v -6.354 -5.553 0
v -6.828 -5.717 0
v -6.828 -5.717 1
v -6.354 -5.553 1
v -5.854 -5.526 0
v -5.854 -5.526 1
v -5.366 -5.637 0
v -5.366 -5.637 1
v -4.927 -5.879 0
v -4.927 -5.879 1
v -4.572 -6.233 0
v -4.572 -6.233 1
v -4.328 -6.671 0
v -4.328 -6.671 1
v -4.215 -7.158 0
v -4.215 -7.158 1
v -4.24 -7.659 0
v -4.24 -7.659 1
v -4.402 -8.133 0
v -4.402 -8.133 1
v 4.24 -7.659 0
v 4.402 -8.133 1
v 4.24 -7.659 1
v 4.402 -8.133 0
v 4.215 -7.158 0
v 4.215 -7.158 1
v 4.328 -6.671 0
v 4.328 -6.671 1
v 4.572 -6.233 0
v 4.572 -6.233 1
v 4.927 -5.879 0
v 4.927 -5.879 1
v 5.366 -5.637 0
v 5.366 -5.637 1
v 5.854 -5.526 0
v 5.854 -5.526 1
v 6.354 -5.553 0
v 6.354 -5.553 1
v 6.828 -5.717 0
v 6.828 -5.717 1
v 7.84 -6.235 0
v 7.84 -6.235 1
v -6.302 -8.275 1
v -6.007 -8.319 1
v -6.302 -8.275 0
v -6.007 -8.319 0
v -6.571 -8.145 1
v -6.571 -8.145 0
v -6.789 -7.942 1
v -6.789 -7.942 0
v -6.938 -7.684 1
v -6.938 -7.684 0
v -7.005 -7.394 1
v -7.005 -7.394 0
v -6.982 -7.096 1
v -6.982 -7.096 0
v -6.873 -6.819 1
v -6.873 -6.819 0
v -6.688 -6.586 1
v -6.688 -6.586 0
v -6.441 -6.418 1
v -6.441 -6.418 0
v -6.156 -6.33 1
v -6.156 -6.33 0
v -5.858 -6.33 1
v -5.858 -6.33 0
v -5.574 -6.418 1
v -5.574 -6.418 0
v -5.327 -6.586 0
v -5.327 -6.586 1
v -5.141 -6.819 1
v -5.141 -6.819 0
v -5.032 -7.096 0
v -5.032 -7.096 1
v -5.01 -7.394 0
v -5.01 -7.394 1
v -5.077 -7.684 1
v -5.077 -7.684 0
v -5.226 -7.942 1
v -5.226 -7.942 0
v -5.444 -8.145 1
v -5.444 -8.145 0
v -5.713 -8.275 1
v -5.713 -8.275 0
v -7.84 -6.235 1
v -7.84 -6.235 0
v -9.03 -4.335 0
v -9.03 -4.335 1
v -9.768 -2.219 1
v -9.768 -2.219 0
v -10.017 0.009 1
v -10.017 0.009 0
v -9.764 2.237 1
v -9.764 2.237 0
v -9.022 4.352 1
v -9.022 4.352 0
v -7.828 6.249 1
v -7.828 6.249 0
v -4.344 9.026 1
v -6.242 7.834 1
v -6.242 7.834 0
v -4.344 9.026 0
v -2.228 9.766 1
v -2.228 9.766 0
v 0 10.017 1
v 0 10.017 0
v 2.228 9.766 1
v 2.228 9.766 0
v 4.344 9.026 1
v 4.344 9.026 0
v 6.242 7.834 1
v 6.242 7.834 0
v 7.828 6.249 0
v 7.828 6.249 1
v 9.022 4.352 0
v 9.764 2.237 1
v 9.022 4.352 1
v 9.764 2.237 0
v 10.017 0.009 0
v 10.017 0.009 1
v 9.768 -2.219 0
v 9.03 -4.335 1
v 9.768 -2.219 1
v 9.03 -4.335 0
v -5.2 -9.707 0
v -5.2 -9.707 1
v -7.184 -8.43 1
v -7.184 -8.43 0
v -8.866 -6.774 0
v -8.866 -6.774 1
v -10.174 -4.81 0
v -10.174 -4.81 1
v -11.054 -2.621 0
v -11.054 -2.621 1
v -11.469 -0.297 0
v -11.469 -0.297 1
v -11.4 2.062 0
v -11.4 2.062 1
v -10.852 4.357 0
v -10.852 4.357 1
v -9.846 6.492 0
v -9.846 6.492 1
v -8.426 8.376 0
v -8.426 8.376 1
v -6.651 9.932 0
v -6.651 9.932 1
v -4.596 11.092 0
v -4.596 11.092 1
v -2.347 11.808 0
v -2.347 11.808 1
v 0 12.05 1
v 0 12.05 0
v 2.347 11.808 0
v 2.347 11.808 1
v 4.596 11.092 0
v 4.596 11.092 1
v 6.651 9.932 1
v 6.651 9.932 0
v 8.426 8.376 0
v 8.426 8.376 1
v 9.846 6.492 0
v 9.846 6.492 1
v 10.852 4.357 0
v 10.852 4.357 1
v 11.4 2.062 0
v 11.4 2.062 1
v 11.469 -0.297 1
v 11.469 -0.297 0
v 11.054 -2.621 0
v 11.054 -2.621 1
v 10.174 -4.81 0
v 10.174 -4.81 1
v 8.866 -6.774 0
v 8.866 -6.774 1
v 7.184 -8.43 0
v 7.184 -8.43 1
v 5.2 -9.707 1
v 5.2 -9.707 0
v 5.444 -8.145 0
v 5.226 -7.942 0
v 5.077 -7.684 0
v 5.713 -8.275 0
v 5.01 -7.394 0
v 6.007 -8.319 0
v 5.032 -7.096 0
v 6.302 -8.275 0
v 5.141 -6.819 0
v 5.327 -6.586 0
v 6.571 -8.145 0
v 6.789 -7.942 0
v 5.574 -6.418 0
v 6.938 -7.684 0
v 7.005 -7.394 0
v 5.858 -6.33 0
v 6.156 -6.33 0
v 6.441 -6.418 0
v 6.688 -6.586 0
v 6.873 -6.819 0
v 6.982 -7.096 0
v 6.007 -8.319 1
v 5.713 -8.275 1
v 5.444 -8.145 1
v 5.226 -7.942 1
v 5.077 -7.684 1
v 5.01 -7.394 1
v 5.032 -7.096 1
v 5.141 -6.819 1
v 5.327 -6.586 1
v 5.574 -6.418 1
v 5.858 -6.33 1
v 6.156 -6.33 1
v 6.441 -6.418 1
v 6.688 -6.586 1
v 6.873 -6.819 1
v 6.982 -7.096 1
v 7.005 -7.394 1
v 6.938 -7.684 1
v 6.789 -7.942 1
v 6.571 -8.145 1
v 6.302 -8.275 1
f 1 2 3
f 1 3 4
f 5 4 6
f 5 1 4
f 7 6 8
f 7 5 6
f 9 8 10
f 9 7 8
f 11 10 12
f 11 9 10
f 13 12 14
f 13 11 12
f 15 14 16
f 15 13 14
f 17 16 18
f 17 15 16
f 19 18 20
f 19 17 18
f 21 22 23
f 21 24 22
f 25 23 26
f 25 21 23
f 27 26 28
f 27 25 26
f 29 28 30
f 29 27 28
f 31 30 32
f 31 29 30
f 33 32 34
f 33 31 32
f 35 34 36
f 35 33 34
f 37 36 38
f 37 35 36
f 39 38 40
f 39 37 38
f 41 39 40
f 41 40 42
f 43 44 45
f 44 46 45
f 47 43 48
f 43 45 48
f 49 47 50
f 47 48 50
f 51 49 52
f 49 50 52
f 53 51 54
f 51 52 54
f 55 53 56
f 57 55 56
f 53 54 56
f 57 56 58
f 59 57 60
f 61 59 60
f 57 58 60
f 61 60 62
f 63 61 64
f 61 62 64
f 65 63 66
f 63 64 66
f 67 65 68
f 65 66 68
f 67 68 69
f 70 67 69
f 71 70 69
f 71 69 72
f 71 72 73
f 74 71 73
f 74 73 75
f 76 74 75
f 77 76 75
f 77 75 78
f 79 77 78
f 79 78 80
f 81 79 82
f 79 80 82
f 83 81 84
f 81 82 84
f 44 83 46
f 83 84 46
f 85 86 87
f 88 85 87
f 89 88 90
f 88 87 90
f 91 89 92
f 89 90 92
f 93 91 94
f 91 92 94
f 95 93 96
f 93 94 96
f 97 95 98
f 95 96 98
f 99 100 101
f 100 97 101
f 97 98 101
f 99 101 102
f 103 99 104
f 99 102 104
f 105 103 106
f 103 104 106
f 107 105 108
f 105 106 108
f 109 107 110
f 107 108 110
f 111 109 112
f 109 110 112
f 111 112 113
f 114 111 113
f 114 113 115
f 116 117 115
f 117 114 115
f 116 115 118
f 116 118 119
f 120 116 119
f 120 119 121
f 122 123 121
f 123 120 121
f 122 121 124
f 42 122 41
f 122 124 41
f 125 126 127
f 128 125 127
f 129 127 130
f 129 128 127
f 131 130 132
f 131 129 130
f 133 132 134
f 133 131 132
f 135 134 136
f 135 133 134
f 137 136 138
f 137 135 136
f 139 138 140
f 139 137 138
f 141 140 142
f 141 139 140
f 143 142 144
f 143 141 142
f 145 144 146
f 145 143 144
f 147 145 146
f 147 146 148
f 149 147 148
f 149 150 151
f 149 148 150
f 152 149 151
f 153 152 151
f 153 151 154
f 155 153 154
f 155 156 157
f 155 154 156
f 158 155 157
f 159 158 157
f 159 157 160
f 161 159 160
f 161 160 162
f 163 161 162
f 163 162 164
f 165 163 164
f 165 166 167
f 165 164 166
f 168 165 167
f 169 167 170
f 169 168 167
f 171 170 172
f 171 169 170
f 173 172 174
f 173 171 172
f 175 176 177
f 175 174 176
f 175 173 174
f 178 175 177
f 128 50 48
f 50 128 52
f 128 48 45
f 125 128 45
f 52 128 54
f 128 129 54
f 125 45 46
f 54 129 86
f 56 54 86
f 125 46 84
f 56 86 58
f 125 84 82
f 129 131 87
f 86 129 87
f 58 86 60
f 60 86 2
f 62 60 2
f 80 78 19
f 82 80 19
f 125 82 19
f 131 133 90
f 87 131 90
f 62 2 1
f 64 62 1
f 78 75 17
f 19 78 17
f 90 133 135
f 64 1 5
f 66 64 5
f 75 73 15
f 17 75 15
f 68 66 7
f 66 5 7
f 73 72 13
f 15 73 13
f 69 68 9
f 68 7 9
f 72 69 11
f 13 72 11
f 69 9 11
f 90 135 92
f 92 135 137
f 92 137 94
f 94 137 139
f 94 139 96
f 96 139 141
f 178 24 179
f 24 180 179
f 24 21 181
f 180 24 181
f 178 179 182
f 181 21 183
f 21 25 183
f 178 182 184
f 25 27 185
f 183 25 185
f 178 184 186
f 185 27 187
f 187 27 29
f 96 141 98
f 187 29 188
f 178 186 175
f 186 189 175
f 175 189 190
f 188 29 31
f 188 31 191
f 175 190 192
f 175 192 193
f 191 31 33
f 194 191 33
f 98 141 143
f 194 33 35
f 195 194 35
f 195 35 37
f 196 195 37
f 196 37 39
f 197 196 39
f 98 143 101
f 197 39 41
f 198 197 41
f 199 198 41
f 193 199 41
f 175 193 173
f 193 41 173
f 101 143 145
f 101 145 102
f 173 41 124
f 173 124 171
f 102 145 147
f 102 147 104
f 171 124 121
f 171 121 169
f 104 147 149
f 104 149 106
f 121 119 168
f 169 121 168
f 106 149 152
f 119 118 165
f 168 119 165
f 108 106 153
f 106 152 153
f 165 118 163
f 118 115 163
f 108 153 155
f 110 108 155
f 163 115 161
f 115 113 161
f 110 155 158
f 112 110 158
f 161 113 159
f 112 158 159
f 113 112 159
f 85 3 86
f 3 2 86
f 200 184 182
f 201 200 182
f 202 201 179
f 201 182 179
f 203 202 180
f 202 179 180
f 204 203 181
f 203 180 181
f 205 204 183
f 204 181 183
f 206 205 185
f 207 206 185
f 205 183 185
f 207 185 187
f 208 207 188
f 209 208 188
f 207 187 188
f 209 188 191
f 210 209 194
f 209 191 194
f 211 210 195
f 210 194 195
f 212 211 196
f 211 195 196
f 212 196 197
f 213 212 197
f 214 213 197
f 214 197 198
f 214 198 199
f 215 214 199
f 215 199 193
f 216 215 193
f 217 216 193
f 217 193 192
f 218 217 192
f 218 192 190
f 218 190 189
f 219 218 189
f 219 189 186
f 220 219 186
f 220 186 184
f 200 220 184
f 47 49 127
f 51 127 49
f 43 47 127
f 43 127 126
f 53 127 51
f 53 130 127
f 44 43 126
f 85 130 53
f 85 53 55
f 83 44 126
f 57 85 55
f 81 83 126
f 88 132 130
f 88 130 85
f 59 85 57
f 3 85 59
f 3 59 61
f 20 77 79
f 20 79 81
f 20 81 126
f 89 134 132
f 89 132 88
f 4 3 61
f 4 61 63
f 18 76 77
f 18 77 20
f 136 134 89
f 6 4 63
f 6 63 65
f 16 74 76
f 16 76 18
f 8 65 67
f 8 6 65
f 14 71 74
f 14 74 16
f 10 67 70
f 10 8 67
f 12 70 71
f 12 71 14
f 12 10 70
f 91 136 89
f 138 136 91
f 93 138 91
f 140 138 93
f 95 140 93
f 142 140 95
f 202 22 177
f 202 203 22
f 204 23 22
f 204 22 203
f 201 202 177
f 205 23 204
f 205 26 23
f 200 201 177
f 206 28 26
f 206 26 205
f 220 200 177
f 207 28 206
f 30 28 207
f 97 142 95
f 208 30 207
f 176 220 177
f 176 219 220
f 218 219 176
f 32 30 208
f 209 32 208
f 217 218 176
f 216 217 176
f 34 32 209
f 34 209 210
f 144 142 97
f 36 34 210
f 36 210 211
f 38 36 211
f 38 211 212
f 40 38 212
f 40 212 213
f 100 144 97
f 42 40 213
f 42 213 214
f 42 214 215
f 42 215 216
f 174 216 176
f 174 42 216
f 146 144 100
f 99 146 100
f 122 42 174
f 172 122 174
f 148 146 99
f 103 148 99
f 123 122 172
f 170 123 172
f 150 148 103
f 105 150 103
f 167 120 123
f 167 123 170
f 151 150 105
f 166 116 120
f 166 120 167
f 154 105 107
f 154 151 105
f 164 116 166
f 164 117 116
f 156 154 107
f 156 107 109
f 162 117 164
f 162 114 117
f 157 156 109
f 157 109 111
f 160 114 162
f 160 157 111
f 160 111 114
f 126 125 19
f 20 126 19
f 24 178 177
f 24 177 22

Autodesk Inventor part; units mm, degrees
ref_plane "WorkPlane1" through (0, 0, 0) normal (0, 0, 1) x (1, 0, 0)
ref_plane "Work Plane2" through (0, 0, -1) normal (0, 0, 1) x (1, 0, 0)
ref_plane "WorkPlane2" through (0, 0, 1) normal (0, 0, 1) x (1, 0, 0)
sketch "Szkic1" plane through (0, 0, 0) normal (0, 0, 1) x (1, 0, 0)
  point P0 (0, 0)
sketch "Szkic2" plane through (0, 0, 0) normal (0, 0, 1) x (1, 0, 0)
  line L0 (5.2, -9.7072) -> (4.4019, -8.1329)
  arc A0 (6.8278, -5.7169) -> (4.4019, -8.1329) centre (6.0074, -7.319) ccw
  line L1 (6.8278, -5.7169) -> (7.8396, -6.235)
  arc A1 (7.8396, -6.235) -> (-7.8396, -6.235) centre (0, 0) ccw
  line L2 (-6.8278, -5.7169) -> (-7.8396, -6.235)
  arc A2 (-4.4019, -8.1329) -> (-6.8278, -5.7169) centre (-6.0074, -7.319) ccw
  line L3 (-5.2, -9.7072) -> (-4.4019, -8.1329)
  arc A3 (5.2, -9.7072) -> (-5.2, -9.7072) centre (0, 0.55) ccw
  line L4 (0, 0.55) -> (-5.2, -9.7072) construction
  line L5 (0, 0.55) -> (5.2, -9.7072) construction
  dimension "d2" = 11.5
  dimension "d4" = 0
  dimension "d6" = 10.0167
  dimension "d8" = 0.55
  dimension "d10" = 5.2
  dimension "d12" = 5.2
  dimension "d14" = 1.8
  dimension "d16" = 1.8
  dimension "d18" = 9.9
  dimension "d20" = 9.9
  dimension "d22" = 36
  dimension "d24" = 36
extrude "Wyciągnięcie proste1" add sketch "Szkic2" along normal blind 1
sketch "Szkic3" plane through (0, 0, 1) normal (0, 0, 1) x (1, 0, 0)
  arc A0 (-4.4019, -8.1329) -> (-6.8278, -5.7169) centre (-6.0074, -7.319) ccw projected
hole "Otwór1" at (-6.0074, -7.319, 1) direction (0, 0, -1) diameter 2 end through all
sketch "Szkic4" plane through (0, 0, 1) normal (0, 0, 1) x (1, 0, 0)
  arc A0 (6.8278, -5.7169) -> (4.4019, -8.1329) centre (6.0074, -7.319) ccw projected
hole "Otwór2" at (6.0074, -7.319, 1) direction (0, 0, -1) diameter 2 end through all
equation "\"d2\" = 0.5 * Diam2"
equation "\"d6\" = 0.5 * msp_dd1"
equation "\"d8\" = -0.5 * msp_dd1 + 0.5 * Diam2 - 0.222222 * ParA"
equation "\"d10\" = 2.6 * Diam5"
equation "\"d12\" = 2.6 * Diam5"
equation "\"d14\" = 0.9 * Diam5"
equation "\"d16\" = 0.9 * Diam5"
equation "\"d18\" = 1.3 * Diam5 + 0.5 * Diam2 - ParA"
equation "\"d20\" = 1.3 * Diam5 + 0.5 * Diam2 - ParA"
equation "\"d25\" = ParS"
equation "\"d29\" = Diam5"
equation "\"d36\" = Diam5"
equation "\"Diam5\" = 2"
equation "\"ParA\" = 4.2"
equation "\"ParS\" = 1"
equation "\"Diam2\" = 23"
equation "\"msp_dd1\" = -b + Diam2 - 0.111111 * ParA"
equation "\"msp_pom\" = 0.5 * Diam2 - b"
equation "\"TEMPLATE\" = 1.2345"
properties part number "DIN 472 - 22x1" material "Stal, miękka"
